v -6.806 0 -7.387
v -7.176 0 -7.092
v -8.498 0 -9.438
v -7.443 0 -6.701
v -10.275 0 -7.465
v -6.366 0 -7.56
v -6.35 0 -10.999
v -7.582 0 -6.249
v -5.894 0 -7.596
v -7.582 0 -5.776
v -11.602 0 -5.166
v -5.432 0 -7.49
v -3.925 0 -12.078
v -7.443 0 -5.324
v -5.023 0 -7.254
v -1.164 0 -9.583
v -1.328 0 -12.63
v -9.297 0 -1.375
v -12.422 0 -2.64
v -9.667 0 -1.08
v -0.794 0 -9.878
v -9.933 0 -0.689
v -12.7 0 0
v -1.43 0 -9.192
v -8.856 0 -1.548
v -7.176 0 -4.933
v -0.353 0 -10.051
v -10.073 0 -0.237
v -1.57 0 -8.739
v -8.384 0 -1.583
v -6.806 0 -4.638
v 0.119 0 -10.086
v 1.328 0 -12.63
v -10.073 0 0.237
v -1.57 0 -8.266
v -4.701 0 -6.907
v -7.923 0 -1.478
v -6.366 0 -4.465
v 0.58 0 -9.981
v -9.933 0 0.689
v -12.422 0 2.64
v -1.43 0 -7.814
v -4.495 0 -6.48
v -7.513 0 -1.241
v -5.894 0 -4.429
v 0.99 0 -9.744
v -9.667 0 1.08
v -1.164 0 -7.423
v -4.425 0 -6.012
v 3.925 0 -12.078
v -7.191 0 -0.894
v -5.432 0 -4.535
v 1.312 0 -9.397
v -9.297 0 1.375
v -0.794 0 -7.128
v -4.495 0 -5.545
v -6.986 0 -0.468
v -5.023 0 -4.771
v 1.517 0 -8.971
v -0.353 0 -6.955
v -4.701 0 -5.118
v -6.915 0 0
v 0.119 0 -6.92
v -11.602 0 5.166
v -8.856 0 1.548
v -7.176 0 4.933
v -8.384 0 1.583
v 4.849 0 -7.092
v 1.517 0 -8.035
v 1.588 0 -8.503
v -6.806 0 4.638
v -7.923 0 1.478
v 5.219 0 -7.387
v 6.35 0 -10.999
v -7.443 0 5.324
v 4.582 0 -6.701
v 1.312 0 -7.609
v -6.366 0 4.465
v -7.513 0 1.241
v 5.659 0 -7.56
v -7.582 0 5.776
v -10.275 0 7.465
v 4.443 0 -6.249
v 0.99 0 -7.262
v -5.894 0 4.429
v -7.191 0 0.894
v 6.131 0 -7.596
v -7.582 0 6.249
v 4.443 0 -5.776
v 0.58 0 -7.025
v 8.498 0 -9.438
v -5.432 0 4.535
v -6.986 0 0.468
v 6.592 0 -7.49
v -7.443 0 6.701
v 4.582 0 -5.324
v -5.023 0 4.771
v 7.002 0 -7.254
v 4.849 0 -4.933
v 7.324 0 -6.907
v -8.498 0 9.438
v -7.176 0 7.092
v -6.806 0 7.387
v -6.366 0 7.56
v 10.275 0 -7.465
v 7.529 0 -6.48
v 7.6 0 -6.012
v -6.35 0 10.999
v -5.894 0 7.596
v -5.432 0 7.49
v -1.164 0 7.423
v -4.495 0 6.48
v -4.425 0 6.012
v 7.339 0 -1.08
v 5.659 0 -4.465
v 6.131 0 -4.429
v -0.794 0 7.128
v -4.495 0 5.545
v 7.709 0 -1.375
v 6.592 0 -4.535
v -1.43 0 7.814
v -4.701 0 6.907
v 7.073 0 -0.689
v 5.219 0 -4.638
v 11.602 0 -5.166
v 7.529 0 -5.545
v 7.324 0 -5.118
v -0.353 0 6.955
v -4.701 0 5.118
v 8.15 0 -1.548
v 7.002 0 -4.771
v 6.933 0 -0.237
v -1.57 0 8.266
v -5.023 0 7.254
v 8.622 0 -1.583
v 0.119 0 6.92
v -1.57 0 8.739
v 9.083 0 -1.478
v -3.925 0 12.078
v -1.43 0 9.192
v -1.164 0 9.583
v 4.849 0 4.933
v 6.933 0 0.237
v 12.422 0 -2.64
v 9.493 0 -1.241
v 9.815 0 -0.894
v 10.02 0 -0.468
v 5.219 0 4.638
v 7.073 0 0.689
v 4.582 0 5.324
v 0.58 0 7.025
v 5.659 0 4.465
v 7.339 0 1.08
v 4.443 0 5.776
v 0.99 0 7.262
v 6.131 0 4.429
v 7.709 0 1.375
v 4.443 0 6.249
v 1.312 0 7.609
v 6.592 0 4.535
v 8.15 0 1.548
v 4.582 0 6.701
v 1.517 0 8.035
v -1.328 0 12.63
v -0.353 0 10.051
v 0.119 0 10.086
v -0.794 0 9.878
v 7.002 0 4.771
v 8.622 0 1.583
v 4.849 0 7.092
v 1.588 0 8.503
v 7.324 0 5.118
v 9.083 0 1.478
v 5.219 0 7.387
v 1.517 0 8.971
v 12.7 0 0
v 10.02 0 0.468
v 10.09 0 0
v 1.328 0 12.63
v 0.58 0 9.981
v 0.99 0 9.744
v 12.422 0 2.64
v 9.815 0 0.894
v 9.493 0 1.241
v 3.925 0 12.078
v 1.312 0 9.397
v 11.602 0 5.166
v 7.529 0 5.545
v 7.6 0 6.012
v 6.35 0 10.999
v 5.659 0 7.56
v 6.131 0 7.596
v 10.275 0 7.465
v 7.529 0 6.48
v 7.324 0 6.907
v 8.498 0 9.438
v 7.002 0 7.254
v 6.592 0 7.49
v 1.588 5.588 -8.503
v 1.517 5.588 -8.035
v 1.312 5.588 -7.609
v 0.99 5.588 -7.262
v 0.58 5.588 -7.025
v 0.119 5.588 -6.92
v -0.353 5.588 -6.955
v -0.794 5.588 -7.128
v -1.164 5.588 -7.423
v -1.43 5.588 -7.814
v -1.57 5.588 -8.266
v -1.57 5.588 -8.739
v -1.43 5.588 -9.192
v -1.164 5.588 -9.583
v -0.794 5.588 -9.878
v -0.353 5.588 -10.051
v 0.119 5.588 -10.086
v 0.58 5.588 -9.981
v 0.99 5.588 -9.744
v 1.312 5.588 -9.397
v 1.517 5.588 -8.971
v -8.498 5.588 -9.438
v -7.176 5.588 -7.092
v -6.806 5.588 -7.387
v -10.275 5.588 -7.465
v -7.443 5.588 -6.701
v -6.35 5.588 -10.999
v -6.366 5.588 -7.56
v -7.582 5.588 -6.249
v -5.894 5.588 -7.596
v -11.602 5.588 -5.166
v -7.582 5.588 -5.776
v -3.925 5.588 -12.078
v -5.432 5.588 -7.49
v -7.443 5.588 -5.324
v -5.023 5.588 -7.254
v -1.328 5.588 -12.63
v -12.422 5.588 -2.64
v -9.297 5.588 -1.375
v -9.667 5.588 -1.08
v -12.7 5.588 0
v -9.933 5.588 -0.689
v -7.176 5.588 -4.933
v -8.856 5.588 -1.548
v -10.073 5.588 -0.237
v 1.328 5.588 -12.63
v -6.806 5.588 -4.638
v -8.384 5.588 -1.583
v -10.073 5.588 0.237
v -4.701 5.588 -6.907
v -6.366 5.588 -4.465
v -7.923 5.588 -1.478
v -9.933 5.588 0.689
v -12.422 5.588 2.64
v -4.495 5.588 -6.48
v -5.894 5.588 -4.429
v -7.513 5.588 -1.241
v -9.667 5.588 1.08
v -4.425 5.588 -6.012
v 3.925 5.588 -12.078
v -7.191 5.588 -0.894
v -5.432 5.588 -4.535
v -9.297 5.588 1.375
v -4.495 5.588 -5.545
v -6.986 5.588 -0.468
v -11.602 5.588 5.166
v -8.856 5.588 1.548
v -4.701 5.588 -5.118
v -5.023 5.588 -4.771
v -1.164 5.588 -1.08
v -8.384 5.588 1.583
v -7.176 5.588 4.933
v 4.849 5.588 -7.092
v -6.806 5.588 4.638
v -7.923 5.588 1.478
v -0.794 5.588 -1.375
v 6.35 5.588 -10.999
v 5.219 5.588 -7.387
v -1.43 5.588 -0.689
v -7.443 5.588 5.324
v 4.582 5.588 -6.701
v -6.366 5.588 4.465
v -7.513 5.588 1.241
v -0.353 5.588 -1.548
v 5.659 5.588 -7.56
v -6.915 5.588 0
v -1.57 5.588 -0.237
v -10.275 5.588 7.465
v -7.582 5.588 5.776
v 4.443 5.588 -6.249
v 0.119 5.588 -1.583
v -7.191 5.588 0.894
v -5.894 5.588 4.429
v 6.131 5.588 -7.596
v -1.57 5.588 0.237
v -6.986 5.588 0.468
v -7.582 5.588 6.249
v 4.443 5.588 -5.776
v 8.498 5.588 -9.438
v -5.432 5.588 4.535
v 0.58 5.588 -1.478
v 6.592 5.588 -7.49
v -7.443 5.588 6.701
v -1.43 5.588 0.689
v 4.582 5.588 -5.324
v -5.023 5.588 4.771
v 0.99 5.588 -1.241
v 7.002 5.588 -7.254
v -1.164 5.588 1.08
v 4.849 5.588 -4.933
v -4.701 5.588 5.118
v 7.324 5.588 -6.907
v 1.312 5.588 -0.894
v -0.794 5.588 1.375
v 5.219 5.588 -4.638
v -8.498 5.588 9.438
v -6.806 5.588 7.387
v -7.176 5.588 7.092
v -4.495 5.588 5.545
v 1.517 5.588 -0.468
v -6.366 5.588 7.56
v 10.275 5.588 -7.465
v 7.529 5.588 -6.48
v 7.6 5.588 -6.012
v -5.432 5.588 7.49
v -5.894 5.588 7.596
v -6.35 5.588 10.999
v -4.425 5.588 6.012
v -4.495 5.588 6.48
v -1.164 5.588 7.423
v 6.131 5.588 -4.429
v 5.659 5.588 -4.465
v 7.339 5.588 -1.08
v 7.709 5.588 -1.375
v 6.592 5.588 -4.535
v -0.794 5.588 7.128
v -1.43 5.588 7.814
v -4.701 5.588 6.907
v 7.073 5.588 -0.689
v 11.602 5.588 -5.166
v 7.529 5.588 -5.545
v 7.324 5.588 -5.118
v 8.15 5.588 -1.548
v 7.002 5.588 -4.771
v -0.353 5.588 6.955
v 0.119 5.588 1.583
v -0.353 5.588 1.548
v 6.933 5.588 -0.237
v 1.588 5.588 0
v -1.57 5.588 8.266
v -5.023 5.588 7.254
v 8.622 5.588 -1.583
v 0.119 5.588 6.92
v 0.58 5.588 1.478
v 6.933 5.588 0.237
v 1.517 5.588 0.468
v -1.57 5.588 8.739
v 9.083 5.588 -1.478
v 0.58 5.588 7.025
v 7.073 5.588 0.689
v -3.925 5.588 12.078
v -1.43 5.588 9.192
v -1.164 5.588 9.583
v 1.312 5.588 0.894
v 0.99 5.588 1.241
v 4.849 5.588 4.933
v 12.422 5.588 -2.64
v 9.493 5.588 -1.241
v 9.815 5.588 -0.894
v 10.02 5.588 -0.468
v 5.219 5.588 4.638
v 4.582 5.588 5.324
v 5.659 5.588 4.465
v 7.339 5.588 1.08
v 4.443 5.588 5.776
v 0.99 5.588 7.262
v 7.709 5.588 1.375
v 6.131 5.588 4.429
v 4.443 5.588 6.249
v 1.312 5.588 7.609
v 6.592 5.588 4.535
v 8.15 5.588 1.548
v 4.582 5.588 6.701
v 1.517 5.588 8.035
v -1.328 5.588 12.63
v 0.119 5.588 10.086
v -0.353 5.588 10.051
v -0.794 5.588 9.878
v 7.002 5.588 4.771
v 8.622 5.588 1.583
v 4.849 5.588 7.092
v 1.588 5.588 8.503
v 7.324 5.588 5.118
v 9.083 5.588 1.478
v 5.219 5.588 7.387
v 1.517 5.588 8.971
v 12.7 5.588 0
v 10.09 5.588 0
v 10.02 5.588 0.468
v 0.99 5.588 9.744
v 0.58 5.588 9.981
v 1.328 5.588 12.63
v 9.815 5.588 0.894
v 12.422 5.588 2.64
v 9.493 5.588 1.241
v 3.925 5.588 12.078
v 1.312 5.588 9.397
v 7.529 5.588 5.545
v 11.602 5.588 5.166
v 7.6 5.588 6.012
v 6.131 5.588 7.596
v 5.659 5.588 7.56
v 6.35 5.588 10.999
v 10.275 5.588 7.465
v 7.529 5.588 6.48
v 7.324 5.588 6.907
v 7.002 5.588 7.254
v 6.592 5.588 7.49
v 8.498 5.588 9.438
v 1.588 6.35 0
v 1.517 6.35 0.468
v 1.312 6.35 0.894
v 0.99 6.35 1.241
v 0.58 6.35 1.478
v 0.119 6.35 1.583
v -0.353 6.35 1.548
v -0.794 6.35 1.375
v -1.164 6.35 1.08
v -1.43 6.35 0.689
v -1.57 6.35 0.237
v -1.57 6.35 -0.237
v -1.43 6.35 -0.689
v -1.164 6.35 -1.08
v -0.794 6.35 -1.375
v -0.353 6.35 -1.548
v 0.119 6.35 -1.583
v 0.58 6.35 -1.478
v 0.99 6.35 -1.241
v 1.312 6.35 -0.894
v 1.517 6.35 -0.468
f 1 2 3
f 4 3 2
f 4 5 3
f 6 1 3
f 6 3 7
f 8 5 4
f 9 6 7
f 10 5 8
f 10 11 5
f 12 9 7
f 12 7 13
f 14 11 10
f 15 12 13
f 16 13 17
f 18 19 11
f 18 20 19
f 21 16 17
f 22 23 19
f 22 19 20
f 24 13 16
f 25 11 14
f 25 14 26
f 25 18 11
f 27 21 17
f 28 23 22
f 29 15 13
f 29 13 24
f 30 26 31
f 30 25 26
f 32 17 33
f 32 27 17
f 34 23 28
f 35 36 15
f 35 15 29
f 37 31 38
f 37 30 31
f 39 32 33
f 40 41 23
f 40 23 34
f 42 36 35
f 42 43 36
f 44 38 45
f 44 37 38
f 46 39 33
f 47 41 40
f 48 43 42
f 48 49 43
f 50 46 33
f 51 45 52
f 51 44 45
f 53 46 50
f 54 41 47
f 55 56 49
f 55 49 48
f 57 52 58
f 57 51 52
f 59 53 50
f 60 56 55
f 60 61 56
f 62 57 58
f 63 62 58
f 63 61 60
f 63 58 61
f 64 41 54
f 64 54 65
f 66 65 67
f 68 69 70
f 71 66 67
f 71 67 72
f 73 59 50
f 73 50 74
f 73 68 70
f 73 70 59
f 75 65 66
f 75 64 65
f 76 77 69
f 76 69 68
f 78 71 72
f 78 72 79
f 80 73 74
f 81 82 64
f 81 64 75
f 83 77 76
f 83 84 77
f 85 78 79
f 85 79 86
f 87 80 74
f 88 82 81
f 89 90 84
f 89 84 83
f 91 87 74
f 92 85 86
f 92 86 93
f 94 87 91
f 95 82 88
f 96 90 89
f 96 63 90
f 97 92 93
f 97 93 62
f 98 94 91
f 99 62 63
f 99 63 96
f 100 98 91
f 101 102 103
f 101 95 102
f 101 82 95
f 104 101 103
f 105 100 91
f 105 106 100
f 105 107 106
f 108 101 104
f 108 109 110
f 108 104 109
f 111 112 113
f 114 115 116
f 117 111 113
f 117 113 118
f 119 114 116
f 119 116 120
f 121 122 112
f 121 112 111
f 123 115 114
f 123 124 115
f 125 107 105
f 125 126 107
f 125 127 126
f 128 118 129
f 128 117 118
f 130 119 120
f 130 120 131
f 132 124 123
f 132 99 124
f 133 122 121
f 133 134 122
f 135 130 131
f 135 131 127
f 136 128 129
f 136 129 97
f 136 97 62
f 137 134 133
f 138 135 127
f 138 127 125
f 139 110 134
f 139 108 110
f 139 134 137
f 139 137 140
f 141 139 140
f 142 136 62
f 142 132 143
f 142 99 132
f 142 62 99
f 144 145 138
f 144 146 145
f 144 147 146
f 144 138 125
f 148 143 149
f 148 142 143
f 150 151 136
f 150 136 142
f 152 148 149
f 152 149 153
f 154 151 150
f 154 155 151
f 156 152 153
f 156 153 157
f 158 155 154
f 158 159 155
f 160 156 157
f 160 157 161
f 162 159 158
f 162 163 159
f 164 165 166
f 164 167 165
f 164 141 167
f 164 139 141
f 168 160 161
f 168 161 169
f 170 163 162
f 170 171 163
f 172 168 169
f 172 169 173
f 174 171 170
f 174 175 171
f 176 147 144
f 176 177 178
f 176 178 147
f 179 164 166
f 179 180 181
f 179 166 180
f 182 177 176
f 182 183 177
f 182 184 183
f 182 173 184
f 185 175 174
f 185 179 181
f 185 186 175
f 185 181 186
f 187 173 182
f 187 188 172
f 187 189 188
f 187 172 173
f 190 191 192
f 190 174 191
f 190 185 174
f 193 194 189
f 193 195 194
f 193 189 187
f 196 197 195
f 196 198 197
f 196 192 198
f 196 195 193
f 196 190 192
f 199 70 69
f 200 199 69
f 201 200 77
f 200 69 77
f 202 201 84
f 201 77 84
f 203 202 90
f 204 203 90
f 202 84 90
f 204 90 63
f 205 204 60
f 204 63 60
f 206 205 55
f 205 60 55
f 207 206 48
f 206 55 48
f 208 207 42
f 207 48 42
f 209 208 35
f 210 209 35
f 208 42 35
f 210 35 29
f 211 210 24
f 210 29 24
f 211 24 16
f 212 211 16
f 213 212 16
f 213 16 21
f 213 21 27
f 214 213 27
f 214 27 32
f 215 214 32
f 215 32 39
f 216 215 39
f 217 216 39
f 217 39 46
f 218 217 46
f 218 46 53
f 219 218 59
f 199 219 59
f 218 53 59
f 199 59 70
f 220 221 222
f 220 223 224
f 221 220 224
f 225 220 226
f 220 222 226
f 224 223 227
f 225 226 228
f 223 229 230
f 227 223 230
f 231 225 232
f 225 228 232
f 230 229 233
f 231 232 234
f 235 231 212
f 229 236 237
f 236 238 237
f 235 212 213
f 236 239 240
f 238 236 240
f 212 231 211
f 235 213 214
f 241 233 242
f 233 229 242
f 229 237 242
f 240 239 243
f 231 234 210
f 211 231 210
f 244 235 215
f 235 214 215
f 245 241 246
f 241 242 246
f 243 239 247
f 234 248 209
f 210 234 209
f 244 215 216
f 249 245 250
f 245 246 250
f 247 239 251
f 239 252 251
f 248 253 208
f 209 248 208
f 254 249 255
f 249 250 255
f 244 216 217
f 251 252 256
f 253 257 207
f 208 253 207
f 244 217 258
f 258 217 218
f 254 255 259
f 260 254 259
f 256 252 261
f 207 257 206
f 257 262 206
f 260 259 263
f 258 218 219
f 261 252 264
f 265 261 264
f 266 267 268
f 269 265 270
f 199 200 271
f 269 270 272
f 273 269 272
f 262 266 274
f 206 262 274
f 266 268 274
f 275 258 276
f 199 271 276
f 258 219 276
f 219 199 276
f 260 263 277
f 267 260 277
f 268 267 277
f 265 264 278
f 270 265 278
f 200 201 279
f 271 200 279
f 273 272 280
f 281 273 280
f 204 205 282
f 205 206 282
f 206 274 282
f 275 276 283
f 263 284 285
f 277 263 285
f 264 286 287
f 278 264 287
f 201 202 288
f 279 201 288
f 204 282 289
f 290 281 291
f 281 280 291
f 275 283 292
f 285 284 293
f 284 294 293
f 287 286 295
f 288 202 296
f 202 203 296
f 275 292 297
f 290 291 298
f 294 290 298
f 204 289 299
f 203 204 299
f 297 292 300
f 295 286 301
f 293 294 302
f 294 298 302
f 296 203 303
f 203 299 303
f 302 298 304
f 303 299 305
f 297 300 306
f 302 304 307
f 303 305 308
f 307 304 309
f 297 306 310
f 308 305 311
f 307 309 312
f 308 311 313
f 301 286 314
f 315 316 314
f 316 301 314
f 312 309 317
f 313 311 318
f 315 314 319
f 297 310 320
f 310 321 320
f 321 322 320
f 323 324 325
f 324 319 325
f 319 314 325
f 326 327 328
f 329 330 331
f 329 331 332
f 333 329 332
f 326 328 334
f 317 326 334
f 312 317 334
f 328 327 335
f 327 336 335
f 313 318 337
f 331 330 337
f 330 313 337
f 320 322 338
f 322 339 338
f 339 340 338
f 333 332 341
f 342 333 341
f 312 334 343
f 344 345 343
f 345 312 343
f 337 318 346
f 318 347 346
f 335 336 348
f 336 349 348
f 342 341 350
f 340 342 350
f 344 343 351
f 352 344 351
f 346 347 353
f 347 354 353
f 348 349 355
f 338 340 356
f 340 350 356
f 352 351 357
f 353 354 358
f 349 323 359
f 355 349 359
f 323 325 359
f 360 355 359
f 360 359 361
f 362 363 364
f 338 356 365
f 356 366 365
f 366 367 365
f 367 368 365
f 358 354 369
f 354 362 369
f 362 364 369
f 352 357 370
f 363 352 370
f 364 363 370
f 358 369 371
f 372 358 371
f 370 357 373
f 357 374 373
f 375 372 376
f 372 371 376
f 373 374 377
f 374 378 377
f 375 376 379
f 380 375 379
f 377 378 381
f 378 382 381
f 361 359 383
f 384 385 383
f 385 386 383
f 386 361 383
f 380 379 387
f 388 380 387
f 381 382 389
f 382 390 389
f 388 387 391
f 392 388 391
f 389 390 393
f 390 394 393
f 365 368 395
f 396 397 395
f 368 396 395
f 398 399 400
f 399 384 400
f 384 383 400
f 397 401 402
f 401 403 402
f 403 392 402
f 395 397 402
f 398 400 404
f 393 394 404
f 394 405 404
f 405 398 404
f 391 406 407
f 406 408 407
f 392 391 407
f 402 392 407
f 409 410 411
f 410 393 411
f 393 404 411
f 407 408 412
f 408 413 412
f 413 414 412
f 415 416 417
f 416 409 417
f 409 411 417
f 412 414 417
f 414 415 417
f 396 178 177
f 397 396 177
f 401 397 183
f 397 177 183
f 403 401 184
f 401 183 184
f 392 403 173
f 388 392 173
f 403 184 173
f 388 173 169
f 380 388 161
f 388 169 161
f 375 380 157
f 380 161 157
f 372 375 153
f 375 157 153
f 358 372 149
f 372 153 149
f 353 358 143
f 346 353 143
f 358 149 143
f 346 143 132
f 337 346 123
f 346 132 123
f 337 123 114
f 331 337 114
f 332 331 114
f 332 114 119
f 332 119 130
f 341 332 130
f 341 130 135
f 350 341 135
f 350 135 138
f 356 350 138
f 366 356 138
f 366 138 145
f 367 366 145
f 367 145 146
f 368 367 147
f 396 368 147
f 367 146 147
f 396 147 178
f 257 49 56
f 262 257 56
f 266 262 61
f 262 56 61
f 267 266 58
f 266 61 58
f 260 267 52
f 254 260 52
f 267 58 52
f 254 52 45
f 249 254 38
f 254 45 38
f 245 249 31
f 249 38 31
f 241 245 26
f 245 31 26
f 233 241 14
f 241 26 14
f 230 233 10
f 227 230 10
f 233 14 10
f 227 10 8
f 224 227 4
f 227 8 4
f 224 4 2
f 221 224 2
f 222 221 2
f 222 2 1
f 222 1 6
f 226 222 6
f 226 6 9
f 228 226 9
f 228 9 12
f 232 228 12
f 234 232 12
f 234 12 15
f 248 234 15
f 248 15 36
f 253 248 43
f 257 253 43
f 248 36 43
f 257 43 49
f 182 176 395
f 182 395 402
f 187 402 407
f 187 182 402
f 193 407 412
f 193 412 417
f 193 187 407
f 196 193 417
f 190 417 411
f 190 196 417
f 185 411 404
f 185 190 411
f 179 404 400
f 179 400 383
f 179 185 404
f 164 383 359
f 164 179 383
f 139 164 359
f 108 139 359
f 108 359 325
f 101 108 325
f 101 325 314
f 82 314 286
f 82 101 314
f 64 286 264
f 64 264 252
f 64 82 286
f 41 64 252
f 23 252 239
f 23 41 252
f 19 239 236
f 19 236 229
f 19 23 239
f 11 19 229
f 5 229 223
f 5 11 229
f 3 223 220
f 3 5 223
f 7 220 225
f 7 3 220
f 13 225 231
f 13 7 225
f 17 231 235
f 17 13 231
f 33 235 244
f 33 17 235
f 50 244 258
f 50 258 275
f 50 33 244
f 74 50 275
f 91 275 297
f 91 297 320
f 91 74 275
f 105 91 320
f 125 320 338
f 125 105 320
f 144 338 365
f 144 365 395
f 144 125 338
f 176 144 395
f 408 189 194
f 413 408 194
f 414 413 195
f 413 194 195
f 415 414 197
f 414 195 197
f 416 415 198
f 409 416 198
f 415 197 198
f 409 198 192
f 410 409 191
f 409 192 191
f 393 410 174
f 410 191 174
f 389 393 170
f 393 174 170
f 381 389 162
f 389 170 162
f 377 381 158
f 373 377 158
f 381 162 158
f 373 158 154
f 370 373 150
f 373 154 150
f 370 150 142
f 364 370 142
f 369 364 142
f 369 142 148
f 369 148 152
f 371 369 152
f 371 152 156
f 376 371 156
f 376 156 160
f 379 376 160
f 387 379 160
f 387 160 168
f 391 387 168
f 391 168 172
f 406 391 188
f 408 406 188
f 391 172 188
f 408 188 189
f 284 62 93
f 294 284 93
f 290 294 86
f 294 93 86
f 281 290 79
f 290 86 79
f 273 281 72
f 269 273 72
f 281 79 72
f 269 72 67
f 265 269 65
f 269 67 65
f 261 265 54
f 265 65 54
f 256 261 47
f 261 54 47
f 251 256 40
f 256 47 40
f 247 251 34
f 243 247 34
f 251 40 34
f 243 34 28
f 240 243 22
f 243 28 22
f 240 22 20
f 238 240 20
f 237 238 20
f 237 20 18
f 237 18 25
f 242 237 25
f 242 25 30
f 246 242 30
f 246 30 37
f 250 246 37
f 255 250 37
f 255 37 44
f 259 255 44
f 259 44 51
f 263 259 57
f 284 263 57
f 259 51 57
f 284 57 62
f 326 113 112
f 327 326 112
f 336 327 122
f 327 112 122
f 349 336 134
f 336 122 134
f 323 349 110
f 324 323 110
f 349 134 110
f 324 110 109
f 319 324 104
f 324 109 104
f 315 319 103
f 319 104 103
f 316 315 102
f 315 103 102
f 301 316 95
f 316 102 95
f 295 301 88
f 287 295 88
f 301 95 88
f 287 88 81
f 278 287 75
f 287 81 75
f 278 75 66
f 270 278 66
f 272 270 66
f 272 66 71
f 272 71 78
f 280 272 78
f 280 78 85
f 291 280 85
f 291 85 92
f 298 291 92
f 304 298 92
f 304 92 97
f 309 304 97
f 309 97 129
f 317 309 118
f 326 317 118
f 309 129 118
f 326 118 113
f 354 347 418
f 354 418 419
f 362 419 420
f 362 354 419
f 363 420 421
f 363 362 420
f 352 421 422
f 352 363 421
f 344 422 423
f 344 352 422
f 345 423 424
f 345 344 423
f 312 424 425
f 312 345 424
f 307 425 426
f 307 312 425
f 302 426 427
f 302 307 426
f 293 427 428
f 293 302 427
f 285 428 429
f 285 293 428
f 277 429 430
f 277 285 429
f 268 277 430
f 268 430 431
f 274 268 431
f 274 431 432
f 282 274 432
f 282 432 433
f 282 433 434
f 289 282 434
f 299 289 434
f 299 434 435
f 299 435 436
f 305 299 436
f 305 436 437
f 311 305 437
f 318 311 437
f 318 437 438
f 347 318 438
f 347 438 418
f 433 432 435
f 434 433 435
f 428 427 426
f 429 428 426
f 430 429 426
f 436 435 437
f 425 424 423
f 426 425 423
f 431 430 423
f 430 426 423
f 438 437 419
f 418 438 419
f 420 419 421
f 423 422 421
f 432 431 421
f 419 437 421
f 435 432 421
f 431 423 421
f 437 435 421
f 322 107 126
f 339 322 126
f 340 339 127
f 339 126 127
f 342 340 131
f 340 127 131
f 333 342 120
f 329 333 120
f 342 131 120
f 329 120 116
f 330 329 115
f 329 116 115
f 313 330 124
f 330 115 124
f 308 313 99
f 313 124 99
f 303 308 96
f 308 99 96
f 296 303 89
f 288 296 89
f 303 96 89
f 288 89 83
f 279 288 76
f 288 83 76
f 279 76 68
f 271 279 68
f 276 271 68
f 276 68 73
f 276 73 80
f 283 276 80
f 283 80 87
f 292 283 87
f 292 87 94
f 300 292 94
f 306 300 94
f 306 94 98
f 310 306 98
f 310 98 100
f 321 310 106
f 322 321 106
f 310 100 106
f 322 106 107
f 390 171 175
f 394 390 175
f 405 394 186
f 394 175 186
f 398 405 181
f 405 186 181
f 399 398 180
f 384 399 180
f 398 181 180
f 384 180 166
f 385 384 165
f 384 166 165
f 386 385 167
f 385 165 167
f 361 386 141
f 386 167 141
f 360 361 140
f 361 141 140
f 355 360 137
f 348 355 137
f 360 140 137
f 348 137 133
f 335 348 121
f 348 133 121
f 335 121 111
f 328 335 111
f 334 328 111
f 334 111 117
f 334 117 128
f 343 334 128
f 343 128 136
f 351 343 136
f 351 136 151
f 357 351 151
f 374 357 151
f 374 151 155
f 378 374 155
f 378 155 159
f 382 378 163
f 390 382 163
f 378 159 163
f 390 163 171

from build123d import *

# Parameters (mm, degrees)
F0_R     = 12.7
F0_R_2   = 1.5875
F0_R_3   = 6.35
F0_R_4   = 3.175
F1_DEPTH = 5.588
F2_R     = 1.5875
F3_DEPTH = 6.35


with BuildPart() as f1:
    # F0 (on Front) → F1 (new body)
    with BuildSketch(Plane.XZ):
        Circle(F0_R)
        with Locations((-6.0124402351, -6.0124402351)):
            Circle(F0_R_2, mode=Mode.SUBTRACT)
        with Locations((0, -8.5028745234)):
            Circle(F0_R_2, mode=Mode.SUBTRACT)
        with Locations((6.0124402351, -6.0124402351)):
            Circle(F0_R_2, mode=Mode.SUBTRACT)
        with Locations((-8.5028745234, 0)):
            Circle(F0_R_2, mode=Mode.SUBTRACT)
        with Locations((-6.0124402351, 6.0124402351)):
            Circle(F0_R_2, mode=Mode.SUBTRACT)
        Circle(F0_R_3, mode=Mode.SUBTRACT)
        with Locations((6.0124402351, 6.0124402351)):
            Circle(F0_R_2, mode=Mode.SUBTRACT)
        with Locations((8.5028745234, 0)):
            Circle(F0_R_2, mode=Mode.SUBTRACT)
        with Locations((0, 8.5028745234)):
            Circle(F0_R_2, mode=Mode.SUBTRACT)
        Circle(F0_R_3)
        Circle(F0_R_4, mode=Mode.SUBTRACT)
        Circle(F0_R_4)
    extrude(amount=-F1_DEPTH)

    # F2 (on Front) → F3 (join)
    with BuildSketch(Plane.XZ):
        Circle(F2_R)
    extrude(amount=-F3_DEPTH)


solid = f1.part
